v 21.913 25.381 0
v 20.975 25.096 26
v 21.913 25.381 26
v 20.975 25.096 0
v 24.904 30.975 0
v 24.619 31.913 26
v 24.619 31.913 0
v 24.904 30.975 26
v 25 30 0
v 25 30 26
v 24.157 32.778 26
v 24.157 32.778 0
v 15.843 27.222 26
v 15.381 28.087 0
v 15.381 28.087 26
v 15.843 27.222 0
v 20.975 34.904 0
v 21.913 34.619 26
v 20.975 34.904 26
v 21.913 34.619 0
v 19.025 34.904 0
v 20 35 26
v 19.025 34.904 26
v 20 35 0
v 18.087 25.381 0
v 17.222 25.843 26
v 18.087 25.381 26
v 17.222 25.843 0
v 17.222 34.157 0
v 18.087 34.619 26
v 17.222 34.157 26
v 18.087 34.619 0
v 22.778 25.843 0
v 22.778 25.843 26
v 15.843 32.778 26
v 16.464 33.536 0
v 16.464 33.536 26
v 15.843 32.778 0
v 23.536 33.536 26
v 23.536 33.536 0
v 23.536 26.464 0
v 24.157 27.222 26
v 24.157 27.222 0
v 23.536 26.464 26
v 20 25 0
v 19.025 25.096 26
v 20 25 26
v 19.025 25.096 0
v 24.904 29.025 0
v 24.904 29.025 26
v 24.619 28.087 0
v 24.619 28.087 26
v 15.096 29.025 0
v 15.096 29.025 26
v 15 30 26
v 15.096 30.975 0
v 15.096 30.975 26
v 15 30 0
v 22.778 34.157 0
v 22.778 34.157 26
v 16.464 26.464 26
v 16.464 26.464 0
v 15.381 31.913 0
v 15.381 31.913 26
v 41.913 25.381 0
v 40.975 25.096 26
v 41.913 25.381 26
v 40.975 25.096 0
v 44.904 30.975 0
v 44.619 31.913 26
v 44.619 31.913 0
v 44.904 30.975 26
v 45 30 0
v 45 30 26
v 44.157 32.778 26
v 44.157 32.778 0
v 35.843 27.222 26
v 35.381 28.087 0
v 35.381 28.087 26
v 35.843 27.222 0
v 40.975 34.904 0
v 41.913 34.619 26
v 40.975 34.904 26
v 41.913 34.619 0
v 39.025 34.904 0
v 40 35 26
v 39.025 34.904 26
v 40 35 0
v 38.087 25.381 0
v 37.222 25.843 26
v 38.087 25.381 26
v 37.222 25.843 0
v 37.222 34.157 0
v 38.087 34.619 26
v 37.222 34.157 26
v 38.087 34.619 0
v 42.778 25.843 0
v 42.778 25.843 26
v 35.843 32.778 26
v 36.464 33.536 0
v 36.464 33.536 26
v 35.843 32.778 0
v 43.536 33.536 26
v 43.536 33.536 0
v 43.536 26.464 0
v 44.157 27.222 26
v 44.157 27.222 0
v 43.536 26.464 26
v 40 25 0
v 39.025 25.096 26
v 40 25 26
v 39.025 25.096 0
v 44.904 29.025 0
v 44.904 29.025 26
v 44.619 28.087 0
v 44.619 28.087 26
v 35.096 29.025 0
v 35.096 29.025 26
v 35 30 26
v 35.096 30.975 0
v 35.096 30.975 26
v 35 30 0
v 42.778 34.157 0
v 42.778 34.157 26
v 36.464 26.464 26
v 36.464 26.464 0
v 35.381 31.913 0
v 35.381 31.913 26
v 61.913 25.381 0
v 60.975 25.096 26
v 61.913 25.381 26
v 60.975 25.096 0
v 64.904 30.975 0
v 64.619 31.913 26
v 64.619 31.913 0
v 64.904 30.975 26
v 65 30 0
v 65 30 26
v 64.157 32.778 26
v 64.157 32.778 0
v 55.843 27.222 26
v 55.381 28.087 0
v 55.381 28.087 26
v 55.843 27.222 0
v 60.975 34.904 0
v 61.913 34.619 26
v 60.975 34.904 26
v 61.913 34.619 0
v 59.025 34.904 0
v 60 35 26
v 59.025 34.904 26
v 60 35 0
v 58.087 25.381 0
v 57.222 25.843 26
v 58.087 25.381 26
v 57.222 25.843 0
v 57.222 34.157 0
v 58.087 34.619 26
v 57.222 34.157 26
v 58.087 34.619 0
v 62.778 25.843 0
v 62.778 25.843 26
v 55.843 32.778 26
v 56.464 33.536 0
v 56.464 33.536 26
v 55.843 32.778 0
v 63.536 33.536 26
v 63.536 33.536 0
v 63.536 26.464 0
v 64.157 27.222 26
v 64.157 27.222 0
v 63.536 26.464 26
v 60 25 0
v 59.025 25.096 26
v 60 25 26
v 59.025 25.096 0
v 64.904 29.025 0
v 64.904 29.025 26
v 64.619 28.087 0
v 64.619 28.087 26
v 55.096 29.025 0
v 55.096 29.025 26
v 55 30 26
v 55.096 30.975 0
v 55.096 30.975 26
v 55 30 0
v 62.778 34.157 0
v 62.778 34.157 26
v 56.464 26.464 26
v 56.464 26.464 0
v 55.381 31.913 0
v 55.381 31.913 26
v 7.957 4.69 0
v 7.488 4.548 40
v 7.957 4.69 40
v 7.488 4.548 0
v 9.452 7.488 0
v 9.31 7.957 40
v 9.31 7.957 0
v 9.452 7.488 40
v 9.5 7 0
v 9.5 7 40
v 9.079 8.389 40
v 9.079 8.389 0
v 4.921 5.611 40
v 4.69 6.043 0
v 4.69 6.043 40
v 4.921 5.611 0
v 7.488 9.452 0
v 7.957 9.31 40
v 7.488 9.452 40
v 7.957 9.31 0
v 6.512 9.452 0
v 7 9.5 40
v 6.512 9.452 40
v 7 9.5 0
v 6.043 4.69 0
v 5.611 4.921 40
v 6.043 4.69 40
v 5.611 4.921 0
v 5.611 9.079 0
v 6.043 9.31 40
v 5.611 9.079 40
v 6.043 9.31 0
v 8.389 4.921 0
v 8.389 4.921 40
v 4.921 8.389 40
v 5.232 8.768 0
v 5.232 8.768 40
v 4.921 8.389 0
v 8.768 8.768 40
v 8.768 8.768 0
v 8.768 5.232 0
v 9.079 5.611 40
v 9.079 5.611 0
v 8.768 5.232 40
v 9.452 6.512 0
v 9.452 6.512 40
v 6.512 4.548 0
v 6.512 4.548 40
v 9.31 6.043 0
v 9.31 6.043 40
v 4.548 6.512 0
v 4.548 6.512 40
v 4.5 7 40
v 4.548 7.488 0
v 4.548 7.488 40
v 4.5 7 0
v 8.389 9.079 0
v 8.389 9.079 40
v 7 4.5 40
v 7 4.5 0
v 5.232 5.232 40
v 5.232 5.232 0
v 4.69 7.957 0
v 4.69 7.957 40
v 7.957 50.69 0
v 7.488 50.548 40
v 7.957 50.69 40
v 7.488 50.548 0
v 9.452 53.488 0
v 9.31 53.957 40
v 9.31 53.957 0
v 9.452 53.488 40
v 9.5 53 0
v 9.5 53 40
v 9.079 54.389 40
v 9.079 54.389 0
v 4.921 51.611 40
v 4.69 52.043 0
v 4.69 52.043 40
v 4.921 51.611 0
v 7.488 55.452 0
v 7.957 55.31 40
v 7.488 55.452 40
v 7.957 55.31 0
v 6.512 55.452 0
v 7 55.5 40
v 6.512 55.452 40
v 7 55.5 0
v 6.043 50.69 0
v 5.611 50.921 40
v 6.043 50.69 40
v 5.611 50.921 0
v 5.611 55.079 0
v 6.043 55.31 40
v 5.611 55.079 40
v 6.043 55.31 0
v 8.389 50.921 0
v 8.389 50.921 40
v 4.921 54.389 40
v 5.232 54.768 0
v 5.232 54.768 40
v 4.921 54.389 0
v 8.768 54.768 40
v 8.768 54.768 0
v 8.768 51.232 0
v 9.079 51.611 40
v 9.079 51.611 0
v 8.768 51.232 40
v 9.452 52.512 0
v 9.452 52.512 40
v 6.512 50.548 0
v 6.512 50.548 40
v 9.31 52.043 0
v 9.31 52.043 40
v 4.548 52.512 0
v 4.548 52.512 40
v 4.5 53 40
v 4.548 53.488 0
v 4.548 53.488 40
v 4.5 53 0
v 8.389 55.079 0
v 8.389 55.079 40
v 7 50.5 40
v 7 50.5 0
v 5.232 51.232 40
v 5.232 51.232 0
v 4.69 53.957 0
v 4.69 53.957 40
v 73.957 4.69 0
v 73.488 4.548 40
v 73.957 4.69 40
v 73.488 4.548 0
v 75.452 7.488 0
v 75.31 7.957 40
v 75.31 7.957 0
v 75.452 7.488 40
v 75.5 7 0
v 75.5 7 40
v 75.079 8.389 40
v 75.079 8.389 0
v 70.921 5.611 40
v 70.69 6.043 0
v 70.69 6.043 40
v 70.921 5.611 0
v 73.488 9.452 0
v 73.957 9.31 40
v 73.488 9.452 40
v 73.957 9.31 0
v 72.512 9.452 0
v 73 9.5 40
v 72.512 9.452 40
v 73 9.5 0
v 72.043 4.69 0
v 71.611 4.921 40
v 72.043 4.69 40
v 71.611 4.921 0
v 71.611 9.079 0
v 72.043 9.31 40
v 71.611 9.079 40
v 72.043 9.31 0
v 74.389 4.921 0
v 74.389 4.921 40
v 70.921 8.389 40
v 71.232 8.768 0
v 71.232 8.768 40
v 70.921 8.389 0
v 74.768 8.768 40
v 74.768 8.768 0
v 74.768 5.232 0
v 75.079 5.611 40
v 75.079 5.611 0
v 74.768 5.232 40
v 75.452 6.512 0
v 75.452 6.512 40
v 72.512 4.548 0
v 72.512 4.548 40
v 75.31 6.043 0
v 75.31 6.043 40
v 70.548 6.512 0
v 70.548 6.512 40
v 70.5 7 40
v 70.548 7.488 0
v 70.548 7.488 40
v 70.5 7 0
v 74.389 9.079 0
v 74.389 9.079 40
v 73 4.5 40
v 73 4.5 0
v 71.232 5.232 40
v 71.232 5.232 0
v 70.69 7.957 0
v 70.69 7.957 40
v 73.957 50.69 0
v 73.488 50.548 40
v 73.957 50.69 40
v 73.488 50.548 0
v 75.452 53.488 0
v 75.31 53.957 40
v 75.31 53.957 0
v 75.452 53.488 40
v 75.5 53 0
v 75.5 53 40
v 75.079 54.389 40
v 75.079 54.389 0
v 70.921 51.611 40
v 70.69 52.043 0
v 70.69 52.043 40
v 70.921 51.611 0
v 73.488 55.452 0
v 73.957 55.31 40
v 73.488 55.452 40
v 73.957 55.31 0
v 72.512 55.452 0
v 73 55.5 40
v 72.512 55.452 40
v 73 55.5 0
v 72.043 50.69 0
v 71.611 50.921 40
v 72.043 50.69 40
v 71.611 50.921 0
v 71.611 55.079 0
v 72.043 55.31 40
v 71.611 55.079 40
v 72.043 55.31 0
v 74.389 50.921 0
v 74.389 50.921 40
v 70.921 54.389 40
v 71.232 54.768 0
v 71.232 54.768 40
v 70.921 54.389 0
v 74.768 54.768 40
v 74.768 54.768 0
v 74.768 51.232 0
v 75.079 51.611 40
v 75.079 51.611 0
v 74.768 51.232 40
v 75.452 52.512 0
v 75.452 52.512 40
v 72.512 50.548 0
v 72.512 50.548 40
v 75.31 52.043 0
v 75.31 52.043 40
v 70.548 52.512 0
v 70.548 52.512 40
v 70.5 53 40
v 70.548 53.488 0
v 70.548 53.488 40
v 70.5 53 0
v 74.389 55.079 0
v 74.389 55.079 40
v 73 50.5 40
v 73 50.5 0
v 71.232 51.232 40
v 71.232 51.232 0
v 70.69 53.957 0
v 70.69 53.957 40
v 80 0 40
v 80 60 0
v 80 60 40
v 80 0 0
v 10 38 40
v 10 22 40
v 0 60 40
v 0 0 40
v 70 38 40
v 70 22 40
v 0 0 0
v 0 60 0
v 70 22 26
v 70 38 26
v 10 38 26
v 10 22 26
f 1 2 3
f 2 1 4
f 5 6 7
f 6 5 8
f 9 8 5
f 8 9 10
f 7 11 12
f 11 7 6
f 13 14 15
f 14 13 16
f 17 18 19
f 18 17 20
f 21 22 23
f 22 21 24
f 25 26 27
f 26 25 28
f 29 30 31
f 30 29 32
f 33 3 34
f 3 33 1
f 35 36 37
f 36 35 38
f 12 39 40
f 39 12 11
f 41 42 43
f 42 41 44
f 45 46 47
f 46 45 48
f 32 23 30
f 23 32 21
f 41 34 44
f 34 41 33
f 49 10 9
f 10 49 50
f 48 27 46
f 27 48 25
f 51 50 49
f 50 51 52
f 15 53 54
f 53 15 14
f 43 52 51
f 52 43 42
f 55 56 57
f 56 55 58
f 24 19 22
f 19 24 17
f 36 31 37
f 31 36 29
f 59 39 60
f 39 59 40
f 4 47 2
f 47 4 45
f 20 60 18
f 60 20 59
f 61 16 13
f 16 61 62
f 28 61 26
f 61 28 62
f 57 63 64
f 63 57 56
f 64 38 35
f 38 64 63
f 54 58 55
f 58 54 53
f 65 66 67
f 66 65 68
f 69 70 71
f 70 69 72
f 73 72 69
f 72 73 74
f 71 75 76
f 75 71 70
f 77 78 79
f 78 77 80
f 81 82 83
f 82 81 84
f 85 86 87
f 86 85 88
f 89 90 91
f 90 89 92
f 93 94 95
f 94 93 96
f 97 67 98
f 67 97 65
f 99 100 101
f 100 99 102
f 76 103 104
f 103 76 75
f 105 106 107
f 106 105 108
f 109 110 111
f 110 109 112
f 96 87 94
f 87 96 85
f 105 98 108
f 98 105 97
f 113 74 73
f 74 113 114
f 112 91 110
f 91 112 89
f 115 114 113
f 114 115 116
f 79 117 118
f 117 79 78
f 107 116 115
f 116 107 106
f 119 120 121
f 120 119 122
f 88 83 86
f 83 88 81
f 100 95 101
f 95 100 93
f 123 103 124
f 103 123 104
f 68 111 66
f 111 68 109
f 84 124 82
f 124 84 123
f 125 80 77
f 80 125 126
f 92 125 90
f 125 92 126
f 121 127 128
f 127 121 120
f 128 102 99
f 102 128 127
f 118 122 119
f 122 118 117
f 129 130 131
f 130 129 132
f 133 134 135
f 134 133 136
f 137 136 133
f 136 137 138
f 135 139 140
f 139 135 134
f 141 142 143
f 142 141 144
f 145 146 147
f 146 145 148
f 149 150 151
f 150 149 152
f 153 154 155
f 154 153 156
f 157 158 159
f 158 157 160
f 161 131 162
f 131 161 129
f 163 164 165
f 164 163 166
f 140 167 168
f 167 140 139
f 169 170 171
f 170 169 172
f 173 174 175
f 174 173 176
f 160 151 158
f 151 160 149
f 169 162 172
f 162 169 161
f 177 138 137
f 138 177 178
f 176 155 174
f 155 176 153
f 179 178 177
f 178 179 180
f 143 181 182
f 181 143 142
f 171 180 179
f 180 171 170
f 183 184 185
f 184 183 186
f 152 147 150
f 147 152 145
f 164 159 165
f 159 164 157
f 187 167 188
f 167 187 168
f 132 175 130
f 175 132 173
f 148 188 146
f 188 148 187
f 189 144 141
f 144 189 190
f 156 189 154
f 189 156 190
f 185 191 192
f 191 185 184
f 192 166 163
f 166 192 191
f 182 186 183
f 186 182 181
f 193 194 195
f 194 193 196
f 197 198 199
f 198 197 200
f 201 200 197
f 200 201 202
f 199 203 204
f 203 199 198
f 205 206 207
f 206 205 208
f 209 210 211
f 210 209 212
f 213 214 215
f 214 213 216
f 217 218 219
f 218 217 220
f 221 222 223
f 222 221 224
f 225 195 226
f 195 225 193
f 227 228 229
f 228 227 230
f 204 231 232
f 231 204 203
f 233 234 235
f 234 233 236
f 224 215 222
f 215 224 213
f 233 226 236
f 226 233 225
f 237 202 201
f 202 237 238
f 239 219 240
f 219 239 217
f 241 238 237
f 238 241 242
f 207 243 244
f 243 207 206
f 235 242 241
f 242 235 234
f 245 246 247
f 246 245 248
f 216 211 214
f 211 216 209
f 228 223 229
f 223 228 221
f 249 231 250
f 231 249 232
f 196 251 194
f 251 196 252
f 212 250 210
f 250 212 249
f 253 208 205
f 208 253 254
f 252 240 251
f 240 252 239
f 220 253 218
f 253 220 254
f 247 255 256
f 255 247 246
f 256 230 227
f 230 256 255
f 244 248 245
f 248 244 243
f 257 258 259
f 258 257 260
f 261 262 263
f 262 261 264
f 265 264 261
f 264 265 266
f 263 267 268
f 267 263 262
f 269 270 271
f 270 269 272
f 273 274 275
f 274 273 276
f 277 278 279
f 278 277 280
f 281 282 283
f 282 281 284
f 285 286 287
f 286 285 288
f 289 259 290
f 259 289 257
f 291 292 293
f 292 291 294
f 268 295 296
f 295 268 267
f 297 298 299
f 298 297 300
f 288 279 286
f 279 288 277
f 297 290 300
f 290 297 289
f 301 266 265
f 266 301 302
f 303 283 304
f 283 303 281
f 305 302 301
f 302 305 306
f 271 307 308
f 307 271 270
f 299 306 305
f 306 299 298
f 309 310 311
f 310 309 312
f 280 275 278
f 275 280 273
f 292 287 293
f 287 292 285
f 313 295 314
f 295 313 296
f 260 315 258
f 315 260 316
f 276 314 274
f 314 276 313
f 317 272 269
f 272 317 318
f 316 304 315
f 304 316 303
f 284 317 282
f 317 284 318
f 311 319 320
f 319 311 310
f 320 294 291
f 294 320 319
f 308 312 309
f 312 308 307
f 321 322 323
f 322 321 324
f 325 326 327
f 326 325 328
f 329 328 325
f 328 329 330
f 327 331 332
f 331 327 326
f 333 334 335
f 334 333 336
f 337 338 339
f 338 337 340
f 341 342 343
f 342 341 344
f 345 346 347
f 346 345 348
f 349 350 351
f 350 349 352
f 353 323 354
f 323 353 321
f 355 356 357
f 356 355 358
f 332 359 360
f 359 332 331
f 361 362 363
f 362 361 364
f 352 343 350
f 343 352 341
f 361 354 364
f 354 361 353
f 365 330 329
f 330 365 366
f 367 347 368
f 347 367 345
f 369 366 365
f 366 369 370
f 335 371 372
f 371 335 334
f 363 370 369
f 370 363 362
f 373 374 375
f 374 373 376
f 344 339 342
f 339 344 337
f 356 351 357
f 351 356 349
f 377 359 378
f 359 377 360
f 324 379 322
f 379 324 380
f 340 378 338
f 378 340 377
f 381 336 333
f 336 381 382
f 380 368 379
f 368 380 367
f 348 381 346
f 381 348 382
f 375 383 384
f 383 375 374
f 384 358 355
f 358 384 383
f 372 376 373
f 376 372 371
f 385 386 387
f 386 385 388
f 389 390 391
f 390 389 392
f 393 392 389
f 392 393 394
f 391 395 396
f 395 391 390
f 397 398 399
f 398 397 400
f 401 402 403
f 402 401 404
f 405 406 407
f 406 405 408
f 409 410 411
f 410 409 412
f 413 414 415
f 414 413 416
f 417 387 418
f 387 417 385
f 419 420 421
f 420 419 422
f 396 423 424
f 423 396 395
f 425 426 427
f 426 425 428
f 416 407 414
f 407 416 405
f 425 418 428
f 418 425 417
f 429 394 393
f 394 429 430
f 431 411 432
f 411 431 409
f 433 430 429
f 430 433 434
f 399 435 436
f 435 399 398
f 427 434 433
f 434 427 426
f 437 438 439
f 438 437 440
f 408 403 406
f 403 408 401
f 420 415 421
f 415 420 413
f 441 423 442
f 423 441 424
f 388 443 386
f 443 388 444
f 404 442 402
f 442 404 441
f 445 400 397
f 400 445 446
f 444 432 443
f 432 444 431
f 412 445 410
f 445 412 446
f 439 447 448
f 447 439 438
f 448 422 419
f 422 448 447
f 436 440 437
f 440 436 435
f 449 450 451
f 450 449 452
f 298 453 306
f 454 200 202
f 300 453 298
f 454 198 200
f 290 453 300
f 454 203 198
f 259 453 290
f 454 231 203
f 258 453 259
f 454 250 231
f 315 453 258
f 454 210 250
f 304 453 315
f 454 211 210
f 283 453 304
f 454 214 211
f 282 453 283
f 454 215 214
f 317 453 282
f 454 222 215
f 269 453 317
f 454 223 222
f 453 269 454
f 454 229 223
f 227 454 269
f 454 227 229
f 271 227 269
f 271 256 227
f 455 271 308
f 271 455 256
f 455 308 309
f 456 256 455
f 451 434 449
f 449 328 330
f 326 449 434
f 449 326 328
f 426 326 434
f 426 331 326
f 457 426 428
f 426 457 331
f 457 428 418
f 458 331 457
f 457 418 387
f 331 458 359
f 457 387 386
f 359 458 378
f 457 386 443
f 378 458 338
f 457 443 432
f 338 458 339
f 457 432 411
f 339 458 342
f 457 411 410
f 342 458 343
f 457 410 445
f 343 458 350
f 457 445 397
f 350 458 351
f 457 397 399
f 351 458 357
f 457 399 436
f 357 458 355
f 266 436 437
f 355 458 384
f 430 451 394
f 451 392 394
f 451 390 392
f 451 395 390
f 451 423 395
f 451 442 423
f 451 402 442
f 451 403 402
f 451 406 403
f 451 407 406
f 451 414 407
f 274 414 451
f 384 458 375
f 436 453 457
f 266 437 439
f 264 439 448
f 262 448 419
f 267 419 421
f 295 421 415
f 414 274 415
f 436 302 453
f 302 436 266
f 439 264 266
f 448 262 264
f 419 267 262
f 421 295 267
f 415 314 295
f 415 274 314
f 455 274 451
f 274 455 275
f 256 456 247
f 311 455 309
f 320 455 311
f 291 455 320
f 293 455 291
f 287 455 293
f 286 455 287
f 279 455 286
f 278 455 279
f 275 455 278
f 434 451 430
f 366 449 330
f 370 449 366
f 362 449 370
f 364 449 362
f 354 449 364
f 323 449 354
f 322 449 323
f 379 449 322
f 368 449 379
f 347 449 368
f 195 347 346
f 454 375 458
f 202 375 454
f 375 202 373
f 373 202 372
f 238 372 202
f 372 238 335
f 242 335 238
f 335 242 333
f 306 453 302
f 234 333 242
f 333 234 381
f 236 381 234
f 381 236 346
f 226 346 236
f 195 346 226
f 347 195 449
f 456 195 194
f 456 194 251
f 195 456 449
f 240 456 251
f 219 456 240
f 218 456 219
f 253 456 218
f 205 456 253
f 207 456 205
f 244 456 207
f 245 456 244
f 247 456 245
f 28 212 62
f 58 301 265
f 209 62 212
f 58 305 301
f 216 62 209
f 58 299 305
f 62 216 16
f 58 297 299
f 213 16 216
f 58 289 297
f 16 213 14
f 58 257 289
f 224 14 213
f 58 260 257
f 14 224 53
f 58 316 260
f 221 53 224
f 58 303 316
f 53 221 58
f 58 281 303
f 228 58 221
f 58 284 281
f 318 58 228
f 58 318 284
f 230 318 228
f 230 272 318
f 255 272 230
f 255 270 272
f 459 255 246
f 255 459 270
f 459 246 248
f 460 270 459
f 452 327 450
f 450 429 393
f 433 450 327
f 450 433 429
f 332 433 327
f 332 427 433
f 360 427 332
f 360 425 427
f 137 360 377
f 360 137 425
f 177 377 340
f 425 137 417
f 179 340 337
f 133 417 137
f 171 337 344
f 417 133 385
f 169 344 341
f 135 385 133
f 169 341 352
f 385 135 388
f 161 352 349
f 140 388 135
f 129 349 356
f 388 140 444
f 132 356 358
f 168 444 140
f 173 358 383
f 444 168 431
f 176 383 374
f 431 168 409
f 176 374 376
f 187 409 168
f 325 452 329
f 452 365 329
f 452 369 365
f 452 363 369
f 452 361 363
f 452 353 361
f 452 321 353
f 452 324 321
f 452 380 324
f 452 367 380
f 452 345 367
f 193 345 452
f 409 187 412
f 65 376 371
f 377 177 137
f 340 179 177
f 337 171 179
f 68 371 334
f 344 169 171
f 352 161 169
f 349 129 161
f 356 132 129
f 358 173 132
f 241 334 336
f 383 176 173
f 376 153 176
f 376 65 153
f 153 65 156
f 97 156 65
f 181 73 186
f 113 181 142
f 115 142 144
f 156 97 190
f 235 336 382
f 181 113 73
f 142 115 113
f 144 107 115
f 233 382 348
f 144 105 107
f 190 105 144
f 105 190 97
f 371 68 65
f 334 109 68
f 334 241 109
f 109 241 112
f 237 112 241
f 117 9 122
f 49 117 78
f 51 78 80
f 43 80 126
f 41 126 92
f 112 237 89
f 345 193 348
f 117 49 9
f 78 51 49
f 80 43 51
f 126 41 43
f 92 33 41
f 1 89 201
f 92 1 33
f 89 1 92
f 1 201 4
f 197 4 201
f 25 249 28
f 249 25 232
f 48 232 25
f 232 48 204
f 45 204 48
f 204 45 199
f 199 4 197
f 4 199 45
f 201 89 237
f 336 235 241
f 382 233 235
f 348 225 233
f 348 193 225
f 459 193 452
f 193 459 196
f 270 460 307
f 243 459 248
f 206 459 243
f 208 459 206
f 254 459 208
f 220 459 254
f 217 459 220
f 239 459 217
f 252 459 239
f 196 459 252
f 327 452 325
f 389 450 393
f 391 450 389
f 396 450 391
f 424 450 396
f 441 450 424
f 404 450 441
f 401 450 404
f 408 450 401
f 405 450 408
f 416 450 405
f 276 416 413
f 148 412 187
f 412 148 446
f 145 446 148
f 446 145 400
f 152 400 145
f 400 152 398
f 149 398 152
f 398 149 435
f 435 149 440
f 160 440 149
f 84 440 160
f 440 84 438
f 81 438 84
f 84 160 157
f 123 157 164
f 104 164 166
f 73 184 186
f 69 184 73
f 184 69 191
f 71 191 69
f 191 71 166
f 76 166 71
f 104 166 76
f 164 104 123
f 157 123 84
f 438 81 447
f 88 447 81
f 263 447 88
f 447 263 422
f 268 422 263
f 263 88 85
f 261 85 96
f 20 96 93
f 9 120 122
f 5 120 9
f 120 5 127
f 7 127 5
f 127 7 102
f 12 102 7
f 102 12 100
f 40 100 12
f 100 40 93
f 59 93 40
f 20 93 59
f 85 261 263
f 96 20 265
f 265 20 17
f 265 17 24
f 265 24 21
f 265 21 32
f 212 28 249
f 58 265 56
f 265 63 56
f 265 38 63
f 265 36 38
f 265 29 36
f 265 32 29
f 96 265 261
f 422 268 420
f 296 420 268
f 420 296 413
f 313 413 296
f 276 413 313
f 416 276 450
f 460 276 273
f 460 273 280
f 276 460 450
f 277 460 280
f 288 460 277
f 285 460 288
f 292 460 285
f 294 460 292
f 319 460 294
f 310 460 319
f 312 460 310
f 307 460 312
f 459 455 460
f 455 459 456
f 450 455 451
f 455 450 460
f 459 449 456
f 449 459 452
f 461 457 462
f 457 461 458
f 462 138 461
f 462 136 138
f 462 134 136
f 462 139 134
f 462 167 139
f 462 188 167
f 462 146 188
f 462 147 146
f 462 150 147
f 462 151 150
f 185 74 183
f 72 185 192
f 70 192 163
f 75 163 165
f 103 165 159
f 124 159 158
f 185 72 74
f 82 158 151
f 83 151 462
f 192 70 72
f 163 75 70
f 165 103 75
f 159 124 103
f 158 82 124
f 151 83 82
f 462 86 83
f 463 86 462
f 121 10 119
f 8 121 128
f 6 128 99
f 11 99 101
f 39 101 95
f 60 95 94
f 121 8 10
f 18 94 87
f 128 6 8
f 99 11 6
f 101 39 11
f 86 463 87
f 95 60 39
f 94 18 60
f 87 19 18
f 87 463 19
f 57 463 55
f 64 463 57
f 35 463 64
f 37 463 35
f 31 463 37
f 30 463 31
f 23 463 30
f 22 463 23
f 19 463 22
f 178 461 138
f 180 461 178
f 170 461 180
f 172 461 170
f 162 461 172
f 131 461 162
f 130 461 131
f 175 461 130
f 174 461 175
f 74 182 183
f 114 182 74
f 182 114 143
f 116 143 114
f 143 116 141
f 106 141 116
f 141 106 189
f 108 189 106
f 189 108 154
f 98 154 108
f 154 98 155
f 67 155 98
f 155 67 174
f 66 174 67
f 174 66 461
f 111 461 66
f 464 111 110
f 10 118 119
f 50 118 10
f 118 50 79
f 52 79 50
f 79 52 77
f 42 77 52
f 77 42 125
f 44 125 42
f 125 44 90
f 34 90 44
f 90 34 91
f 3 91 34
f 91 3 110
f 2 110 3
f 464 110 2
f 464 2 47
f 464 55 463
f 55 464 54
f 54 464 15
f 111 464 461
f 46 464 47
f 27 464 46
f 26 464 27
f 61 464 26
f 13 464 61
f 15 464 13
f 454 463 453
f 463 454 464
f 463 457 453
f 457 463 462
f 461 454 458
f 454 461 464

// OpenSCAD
$fn = 32;

// ----------------------------------------------------------------------
// Manifold block: gallery_top manifold
// ----------------------------------------------------------------------

// --- parameters (mm) ---
block_l = 80;             // block length, X
block_w = 60;             // block width, Y
block_h = 40;             // block height, Z
port_d = 10;              // port bore diameter
port_pitch = 20;          // port pitch along X
gallery_d = 16;           // top gallery width, Y
gallery_depth = 14;       // gallery pocket depth
wall_p = 10;              // gallery end wall thickness, X
mnt_d = 5;                // mounting hole diameter
mnt_in = 7;               // mounting hole inset from the edges

n_ports = 3;  // ports in the row
port_x0 = (block_l - (n_ports - 1) * port_pitch) / 2;  // first port X

difference() {
  cube([block_l, block_w, block_h]);
  for (i = [0 : n_ports - 1])
    translate([port_x0 + i * port_pitch, block_w / 2, -1])
      cylinder(h = block_h + 2, d = port_d);
  translate([wall_p, block_w / 2 - gallery_d / 2, block_h - gallery_depth])
    cube([block_l - 2 * wall_p, gallery_d, gallery_depth + 1]);
  for (cx = [mnt_in, block_l - mnt_in])
    for (cy = [mnt_in, block_w - mnt_in])
      translate([cx, cy, -1]) cylinder(h = block_h + 2, d = mnt_d);
}
